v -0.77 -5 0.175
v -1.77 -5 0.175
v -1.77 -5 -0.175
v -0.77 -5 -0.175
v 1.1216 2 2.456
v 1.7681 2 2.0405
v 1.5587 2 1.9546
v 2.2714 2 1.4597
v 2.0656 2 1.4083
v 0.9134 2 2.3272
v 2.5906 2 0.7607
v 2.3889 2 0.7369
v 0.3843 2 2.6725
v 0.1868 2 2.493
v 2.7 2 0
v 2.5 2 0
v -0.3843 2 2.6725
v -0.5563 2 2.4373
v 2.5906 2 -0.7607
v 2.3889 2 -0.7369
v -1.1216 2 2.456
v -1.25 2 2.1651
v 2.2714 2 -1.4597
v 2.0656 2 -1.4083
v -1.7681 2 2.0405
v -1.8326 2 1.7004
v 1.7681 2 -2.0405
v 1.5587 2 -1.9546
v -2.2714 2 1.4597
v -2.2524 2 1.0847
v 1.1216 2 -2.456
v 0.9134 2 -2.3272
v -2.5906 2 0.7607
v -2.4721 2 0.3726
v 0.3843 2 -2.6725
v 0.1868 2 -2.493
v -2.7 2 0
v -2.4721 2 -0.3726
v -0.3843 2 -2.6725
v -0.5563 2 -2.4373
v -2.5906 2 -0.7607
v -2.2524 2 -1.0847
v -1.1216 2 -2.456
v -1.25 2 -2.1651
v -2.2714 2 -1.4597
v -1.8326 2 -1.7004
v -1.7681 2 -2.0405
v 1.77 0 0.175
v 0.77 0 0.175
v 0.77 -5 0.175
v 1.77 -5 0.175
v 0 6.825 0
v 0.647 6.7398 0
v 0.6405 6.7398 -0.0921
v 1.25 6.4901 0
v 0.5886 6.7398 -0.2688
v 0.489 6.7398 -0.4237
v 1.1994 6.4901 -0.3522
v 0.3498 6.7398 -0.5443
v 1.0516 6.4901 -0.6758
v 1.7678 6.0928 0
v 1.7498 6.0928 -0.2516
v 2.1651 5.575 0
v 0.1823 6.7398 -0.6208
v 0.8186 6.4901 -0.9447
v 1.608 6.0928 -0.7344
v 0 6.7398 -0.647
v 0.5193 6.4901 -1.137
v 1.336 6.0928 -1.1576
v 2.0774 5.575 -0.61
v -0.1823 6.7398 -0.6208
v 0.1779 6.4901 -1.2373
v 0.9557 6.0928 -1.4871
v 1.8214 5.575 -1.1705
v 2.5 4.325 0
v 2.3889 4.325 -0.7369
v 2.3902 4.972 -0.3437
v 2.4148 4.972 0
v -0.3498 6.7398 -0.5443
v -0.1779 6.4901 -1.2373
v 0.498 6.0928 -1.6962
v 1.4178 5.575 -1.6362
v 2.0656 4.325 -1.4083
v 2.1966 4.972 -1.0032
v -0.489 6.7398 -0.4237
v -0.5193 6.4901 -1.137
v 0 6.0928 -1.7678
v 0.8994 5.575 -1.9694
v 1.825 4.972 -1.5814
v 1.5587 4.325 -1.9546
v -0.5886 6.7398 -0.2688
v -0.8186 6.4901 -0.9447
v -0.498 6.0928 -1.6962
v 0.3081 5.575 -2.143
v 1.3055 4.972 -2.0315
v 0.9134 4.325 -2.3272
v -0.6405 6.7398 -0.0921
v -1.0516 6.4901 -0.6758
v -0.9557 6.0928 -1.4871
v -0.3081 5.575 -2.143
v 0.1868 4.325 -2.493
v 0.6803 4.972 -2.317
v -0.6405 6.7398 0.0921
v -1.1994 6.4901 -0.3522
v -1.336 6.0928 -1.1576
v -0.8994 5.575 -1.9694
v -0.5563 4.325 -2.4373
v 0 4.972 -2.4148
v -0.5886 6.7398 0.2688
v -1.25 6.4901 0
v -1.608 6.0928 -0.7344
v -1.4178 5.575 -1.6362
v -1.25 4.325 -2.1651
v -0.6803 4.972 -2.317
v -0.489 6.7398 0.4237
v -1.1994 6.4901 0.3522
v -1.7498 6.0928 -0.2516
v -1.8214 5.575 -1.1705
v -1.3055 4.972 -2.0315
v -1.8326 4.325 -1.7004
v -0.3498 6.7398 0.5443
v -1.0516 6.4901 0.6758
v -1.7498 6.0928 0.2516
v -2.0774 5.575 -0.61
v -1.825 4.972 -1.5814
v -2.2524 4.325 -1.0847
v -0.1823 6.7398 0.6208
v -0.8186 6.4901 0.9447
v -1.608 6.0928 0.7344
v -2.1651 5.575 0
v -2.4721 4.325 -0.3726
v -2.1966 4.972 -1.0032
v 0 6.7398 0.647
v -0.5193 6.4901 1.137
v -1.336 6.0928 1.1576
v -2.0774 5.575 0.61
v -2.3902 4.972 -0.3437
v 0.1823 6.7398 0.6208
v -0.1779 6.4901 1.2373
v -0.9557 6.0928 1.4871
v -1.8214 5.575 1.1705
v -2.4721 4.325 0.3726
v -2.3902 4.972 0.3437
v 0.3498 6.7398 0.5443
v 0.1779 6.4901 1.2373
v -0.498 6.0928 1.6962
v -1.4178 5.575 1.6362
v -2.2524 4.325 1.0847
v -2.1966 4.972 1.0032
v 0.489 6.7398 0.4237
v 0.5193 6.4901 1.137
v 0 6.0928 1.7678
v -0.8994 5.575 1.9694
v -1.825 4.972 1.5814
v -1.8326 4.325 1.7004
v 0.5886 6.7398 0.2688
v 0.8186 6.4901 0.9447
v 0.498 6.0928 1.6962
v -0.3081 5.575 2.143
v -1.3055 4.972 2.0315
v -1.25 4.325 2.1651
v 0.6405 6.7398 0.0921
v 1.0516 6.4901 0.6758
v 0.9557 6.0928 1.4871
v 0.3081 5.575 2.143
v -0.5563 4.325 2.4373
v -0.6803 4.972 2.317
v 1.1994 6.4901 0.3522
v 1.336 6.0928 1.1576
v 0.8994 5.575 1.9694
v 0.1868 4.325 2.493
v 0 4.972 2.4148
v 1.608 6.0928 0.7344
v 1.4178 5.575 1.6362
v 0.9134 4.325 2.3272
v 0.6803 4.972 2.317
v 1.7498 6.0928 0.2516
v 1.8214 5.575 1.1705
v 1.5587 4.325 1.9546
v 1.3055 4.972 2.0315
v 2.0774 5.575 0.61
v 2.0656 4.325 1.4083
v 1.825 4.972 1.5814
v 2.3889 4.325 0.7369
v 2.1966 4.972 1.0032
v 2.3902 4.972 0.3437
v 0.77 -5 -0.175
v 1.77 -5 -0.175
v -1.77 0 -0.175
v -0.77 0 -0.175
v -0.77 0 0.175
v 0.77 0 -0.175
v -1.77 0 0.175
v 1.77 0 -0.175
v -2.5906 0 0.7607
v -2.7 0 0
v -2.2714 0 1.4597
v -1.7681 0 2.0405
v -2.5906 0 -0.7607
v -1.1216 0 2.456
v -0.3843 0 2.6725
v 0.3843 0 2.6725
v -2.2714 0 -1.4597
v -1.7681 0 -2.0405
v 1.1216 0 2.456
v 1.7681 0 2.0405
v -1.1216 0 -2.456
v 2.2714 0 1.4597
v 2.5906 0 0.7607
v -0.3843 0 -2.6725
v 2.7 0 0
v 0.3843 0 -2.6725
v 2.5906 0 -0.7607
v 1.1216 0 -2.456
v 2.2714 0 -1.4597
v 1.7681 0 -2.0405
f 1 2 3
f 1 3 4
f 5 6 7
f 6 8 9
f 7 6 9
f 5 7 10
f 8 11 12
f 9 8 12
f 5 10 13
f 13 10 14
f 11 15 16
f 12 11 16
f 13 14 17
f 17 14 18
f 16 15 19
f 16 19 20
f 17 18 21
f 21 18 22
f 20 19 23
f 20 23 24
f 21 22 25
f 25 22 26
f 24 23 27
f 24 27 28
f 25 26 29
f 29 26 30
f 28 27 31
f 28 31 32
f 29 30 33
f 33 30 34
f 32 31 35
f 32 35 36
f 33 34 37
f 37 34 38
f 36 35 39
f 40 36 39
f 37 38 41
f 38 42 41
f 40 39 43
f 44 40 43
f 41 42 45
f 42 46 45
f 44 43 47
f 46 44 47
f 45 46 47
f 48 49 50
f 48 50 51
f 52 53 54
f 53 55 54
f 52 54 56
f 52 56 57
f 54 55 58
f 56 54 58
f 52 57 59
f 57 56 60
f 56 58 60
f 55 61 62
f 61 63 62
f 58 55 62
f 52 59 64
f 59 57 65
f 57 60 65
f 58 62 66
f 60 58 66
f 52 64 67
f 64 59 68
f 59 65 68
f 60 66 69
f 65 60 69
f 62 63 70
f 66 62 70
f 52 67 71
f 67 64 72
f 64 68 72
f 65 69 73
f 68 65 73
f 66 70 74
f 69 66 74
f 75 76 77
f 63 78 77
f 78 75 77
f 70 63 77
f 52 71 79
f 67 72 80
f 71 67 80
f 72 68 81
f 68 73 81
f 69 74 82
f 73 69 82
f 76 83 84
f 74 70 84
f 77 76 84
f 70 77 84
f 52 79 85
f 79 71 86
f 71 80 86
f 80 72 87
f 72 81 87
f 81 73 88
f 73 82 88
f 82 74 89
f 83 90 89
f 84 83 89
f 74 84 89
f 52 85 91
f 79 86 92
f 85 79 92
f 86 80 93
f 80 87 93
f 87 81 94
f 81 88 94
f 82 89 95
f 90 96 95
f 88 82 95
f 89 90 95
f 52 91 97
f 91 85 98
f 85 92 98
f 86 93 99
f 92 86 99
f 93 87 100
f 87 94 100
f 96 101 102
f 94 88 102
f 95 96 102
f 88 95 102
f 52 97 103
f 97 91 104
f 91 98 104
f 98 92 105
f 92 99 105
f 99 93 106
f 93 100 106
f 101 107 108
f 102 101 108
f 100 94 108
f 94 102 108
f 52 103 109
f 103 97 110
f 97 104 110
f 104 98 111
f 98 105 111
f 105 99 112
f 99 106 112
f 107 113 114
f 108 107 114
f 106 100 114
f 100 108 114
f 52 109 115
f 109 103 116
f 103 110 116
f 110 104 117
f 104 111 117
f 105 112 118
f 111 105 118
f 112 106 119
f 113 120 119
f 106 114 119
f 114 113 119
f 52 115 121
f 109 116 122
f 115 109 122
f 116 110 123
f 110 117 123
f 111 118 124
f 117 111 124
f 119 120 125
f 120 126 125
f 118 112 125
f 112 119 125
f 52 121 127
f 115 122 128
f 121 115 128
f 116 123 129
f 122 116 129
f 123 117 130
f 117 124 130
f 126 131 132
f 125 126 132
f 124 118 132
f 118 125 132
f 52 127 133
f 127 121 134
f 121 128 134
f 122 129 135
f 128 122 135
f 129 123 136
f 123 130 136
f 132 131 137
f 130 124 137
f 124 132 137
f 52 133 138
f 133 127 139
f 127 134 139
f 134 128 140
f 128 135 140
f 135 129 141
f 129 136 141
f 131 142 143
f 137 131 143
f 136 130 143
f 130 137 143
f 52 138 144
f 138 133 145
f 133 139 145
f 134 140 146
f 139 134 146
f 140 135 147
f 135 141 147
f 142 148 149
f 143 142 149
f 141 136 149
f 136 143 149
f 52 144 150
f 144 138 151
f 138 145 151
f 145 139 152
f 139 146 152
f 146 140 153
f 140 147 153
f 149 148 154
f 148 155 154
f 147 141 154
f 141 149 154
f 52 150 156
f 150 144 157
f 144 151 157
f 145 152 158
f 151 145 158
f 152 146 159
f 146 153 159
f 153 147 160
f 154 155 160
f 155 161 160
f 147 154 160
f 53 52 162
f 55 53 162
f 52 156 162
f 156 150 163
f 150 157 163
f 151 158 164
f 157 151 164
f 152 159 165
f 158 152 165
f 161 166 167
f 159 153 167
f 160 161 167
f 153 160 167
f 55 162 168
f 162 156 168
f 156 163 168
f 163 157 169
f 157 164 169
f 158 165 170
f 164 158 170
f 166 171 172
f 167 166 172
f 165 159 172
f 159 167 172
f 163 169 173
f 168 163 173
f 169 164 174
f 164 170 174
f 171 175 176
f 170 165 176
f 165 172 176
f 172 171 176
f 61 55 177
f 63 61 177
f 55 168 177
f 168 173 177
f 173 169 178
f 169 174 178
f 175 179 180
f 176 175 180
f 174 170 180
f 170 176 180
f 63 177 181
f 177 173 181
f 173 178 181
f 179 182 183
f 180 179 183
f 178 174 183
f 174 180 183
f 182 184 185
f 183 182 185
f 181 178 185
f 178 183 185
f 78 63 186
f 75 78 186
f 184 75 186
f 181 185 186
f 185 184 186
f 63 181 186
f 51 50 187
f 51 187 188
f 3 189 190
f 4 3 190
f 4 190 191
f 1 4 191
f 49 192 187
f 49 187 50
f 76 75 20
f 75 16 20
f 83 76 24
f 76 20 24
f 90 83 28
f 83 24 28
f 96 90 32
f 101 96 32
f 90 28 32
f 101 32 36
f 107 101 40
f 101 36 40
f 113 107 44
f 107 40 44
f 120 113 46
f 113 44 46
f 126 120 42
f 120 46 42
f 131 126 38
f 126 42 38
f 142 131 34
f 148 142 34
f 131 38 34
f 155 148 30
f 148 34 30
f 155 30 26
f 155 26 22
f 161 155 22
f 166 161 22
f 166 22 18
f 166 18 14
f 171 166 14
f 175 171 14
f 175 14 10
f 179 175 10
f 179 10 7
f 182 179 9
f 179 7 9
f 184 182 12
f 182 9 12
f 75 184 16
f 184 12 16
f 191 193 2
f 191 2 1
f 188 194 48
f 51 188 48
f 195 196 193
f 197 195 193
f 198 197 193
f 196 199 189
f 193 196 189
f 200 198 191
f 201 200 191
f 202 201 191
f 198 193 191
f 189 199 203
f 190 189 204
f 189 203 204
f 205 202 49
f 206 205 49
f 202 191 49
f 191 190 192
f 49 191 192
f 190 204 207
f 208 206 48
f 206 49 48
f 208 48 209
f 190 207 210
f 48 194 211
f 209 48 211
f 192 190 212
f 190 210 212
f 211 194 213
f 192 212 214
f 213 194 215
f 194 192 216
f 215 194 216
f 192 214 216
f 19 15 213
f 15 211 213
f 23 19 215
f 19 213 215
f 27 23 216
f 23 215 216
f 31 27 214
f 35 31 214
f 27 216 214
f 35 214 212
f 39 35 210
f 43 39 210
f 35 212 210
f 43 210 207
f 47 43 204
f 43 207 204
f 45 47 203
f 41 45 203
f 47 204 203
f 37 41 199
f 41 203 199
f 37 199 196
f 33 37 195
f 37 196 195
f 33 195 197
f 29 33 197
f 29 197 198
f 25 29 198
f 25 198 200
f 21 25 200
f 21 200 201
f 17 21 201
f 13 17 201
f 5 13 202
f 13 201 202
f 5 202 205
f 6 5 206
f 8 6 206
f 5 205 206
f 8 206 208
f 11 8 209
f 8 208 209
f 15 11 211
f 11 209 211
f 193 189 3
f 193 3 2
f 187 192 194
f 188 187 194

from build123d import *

# Parameters (mm, degrees)
SKETCH2_W                = 1
SKETCH2_H                = 0.35
BOSS_EXTRUDE1_DEPTH      = 5
BOSS_EXTRUDE1_DEPTH_BACK = 5


with BuildPart() as part:
    # Sketch1 → Revolve1 (revolve)
    with BuildSketch(Plane.XY):
        with BuildLine():
            Line((0, 0), (0, 6.825))
            ThreePointArc((0, 6.825), (1.767766953, 6.092766953), (2.5, 4.325))
            Line((2.5, 4.325), (2.5, 2))
            Line((2.5, 2), (2.7, 2))
            Line((2.7, 2), (2.7, 0))
            Line((2.7, 0), (0, 0))
        make_face()
    revolve(axis=Axis((0, 0, 0), (0, 1, 0)))

    # Sketch2 → Boss-Extrude1 (add, two sides)
    with BuildSketch(Plane.XZ) as boss_extrude1_sk:
        with Locations((1.27, 0)):
            Rectangle(SKETCH2_W, SKETCH2_H)
        with Locations((-1.27, 0)):
            Rectangle(SKETCH2_W, SKETCH2_H)
    extrude(amount=BOSS_EXTRUDE1_DEPTH)
    extrude(boss_extrude1_sk.sketch, amount=-BOSS_EXTRUDE1_DEPTH_BACK)


solid = part.part
